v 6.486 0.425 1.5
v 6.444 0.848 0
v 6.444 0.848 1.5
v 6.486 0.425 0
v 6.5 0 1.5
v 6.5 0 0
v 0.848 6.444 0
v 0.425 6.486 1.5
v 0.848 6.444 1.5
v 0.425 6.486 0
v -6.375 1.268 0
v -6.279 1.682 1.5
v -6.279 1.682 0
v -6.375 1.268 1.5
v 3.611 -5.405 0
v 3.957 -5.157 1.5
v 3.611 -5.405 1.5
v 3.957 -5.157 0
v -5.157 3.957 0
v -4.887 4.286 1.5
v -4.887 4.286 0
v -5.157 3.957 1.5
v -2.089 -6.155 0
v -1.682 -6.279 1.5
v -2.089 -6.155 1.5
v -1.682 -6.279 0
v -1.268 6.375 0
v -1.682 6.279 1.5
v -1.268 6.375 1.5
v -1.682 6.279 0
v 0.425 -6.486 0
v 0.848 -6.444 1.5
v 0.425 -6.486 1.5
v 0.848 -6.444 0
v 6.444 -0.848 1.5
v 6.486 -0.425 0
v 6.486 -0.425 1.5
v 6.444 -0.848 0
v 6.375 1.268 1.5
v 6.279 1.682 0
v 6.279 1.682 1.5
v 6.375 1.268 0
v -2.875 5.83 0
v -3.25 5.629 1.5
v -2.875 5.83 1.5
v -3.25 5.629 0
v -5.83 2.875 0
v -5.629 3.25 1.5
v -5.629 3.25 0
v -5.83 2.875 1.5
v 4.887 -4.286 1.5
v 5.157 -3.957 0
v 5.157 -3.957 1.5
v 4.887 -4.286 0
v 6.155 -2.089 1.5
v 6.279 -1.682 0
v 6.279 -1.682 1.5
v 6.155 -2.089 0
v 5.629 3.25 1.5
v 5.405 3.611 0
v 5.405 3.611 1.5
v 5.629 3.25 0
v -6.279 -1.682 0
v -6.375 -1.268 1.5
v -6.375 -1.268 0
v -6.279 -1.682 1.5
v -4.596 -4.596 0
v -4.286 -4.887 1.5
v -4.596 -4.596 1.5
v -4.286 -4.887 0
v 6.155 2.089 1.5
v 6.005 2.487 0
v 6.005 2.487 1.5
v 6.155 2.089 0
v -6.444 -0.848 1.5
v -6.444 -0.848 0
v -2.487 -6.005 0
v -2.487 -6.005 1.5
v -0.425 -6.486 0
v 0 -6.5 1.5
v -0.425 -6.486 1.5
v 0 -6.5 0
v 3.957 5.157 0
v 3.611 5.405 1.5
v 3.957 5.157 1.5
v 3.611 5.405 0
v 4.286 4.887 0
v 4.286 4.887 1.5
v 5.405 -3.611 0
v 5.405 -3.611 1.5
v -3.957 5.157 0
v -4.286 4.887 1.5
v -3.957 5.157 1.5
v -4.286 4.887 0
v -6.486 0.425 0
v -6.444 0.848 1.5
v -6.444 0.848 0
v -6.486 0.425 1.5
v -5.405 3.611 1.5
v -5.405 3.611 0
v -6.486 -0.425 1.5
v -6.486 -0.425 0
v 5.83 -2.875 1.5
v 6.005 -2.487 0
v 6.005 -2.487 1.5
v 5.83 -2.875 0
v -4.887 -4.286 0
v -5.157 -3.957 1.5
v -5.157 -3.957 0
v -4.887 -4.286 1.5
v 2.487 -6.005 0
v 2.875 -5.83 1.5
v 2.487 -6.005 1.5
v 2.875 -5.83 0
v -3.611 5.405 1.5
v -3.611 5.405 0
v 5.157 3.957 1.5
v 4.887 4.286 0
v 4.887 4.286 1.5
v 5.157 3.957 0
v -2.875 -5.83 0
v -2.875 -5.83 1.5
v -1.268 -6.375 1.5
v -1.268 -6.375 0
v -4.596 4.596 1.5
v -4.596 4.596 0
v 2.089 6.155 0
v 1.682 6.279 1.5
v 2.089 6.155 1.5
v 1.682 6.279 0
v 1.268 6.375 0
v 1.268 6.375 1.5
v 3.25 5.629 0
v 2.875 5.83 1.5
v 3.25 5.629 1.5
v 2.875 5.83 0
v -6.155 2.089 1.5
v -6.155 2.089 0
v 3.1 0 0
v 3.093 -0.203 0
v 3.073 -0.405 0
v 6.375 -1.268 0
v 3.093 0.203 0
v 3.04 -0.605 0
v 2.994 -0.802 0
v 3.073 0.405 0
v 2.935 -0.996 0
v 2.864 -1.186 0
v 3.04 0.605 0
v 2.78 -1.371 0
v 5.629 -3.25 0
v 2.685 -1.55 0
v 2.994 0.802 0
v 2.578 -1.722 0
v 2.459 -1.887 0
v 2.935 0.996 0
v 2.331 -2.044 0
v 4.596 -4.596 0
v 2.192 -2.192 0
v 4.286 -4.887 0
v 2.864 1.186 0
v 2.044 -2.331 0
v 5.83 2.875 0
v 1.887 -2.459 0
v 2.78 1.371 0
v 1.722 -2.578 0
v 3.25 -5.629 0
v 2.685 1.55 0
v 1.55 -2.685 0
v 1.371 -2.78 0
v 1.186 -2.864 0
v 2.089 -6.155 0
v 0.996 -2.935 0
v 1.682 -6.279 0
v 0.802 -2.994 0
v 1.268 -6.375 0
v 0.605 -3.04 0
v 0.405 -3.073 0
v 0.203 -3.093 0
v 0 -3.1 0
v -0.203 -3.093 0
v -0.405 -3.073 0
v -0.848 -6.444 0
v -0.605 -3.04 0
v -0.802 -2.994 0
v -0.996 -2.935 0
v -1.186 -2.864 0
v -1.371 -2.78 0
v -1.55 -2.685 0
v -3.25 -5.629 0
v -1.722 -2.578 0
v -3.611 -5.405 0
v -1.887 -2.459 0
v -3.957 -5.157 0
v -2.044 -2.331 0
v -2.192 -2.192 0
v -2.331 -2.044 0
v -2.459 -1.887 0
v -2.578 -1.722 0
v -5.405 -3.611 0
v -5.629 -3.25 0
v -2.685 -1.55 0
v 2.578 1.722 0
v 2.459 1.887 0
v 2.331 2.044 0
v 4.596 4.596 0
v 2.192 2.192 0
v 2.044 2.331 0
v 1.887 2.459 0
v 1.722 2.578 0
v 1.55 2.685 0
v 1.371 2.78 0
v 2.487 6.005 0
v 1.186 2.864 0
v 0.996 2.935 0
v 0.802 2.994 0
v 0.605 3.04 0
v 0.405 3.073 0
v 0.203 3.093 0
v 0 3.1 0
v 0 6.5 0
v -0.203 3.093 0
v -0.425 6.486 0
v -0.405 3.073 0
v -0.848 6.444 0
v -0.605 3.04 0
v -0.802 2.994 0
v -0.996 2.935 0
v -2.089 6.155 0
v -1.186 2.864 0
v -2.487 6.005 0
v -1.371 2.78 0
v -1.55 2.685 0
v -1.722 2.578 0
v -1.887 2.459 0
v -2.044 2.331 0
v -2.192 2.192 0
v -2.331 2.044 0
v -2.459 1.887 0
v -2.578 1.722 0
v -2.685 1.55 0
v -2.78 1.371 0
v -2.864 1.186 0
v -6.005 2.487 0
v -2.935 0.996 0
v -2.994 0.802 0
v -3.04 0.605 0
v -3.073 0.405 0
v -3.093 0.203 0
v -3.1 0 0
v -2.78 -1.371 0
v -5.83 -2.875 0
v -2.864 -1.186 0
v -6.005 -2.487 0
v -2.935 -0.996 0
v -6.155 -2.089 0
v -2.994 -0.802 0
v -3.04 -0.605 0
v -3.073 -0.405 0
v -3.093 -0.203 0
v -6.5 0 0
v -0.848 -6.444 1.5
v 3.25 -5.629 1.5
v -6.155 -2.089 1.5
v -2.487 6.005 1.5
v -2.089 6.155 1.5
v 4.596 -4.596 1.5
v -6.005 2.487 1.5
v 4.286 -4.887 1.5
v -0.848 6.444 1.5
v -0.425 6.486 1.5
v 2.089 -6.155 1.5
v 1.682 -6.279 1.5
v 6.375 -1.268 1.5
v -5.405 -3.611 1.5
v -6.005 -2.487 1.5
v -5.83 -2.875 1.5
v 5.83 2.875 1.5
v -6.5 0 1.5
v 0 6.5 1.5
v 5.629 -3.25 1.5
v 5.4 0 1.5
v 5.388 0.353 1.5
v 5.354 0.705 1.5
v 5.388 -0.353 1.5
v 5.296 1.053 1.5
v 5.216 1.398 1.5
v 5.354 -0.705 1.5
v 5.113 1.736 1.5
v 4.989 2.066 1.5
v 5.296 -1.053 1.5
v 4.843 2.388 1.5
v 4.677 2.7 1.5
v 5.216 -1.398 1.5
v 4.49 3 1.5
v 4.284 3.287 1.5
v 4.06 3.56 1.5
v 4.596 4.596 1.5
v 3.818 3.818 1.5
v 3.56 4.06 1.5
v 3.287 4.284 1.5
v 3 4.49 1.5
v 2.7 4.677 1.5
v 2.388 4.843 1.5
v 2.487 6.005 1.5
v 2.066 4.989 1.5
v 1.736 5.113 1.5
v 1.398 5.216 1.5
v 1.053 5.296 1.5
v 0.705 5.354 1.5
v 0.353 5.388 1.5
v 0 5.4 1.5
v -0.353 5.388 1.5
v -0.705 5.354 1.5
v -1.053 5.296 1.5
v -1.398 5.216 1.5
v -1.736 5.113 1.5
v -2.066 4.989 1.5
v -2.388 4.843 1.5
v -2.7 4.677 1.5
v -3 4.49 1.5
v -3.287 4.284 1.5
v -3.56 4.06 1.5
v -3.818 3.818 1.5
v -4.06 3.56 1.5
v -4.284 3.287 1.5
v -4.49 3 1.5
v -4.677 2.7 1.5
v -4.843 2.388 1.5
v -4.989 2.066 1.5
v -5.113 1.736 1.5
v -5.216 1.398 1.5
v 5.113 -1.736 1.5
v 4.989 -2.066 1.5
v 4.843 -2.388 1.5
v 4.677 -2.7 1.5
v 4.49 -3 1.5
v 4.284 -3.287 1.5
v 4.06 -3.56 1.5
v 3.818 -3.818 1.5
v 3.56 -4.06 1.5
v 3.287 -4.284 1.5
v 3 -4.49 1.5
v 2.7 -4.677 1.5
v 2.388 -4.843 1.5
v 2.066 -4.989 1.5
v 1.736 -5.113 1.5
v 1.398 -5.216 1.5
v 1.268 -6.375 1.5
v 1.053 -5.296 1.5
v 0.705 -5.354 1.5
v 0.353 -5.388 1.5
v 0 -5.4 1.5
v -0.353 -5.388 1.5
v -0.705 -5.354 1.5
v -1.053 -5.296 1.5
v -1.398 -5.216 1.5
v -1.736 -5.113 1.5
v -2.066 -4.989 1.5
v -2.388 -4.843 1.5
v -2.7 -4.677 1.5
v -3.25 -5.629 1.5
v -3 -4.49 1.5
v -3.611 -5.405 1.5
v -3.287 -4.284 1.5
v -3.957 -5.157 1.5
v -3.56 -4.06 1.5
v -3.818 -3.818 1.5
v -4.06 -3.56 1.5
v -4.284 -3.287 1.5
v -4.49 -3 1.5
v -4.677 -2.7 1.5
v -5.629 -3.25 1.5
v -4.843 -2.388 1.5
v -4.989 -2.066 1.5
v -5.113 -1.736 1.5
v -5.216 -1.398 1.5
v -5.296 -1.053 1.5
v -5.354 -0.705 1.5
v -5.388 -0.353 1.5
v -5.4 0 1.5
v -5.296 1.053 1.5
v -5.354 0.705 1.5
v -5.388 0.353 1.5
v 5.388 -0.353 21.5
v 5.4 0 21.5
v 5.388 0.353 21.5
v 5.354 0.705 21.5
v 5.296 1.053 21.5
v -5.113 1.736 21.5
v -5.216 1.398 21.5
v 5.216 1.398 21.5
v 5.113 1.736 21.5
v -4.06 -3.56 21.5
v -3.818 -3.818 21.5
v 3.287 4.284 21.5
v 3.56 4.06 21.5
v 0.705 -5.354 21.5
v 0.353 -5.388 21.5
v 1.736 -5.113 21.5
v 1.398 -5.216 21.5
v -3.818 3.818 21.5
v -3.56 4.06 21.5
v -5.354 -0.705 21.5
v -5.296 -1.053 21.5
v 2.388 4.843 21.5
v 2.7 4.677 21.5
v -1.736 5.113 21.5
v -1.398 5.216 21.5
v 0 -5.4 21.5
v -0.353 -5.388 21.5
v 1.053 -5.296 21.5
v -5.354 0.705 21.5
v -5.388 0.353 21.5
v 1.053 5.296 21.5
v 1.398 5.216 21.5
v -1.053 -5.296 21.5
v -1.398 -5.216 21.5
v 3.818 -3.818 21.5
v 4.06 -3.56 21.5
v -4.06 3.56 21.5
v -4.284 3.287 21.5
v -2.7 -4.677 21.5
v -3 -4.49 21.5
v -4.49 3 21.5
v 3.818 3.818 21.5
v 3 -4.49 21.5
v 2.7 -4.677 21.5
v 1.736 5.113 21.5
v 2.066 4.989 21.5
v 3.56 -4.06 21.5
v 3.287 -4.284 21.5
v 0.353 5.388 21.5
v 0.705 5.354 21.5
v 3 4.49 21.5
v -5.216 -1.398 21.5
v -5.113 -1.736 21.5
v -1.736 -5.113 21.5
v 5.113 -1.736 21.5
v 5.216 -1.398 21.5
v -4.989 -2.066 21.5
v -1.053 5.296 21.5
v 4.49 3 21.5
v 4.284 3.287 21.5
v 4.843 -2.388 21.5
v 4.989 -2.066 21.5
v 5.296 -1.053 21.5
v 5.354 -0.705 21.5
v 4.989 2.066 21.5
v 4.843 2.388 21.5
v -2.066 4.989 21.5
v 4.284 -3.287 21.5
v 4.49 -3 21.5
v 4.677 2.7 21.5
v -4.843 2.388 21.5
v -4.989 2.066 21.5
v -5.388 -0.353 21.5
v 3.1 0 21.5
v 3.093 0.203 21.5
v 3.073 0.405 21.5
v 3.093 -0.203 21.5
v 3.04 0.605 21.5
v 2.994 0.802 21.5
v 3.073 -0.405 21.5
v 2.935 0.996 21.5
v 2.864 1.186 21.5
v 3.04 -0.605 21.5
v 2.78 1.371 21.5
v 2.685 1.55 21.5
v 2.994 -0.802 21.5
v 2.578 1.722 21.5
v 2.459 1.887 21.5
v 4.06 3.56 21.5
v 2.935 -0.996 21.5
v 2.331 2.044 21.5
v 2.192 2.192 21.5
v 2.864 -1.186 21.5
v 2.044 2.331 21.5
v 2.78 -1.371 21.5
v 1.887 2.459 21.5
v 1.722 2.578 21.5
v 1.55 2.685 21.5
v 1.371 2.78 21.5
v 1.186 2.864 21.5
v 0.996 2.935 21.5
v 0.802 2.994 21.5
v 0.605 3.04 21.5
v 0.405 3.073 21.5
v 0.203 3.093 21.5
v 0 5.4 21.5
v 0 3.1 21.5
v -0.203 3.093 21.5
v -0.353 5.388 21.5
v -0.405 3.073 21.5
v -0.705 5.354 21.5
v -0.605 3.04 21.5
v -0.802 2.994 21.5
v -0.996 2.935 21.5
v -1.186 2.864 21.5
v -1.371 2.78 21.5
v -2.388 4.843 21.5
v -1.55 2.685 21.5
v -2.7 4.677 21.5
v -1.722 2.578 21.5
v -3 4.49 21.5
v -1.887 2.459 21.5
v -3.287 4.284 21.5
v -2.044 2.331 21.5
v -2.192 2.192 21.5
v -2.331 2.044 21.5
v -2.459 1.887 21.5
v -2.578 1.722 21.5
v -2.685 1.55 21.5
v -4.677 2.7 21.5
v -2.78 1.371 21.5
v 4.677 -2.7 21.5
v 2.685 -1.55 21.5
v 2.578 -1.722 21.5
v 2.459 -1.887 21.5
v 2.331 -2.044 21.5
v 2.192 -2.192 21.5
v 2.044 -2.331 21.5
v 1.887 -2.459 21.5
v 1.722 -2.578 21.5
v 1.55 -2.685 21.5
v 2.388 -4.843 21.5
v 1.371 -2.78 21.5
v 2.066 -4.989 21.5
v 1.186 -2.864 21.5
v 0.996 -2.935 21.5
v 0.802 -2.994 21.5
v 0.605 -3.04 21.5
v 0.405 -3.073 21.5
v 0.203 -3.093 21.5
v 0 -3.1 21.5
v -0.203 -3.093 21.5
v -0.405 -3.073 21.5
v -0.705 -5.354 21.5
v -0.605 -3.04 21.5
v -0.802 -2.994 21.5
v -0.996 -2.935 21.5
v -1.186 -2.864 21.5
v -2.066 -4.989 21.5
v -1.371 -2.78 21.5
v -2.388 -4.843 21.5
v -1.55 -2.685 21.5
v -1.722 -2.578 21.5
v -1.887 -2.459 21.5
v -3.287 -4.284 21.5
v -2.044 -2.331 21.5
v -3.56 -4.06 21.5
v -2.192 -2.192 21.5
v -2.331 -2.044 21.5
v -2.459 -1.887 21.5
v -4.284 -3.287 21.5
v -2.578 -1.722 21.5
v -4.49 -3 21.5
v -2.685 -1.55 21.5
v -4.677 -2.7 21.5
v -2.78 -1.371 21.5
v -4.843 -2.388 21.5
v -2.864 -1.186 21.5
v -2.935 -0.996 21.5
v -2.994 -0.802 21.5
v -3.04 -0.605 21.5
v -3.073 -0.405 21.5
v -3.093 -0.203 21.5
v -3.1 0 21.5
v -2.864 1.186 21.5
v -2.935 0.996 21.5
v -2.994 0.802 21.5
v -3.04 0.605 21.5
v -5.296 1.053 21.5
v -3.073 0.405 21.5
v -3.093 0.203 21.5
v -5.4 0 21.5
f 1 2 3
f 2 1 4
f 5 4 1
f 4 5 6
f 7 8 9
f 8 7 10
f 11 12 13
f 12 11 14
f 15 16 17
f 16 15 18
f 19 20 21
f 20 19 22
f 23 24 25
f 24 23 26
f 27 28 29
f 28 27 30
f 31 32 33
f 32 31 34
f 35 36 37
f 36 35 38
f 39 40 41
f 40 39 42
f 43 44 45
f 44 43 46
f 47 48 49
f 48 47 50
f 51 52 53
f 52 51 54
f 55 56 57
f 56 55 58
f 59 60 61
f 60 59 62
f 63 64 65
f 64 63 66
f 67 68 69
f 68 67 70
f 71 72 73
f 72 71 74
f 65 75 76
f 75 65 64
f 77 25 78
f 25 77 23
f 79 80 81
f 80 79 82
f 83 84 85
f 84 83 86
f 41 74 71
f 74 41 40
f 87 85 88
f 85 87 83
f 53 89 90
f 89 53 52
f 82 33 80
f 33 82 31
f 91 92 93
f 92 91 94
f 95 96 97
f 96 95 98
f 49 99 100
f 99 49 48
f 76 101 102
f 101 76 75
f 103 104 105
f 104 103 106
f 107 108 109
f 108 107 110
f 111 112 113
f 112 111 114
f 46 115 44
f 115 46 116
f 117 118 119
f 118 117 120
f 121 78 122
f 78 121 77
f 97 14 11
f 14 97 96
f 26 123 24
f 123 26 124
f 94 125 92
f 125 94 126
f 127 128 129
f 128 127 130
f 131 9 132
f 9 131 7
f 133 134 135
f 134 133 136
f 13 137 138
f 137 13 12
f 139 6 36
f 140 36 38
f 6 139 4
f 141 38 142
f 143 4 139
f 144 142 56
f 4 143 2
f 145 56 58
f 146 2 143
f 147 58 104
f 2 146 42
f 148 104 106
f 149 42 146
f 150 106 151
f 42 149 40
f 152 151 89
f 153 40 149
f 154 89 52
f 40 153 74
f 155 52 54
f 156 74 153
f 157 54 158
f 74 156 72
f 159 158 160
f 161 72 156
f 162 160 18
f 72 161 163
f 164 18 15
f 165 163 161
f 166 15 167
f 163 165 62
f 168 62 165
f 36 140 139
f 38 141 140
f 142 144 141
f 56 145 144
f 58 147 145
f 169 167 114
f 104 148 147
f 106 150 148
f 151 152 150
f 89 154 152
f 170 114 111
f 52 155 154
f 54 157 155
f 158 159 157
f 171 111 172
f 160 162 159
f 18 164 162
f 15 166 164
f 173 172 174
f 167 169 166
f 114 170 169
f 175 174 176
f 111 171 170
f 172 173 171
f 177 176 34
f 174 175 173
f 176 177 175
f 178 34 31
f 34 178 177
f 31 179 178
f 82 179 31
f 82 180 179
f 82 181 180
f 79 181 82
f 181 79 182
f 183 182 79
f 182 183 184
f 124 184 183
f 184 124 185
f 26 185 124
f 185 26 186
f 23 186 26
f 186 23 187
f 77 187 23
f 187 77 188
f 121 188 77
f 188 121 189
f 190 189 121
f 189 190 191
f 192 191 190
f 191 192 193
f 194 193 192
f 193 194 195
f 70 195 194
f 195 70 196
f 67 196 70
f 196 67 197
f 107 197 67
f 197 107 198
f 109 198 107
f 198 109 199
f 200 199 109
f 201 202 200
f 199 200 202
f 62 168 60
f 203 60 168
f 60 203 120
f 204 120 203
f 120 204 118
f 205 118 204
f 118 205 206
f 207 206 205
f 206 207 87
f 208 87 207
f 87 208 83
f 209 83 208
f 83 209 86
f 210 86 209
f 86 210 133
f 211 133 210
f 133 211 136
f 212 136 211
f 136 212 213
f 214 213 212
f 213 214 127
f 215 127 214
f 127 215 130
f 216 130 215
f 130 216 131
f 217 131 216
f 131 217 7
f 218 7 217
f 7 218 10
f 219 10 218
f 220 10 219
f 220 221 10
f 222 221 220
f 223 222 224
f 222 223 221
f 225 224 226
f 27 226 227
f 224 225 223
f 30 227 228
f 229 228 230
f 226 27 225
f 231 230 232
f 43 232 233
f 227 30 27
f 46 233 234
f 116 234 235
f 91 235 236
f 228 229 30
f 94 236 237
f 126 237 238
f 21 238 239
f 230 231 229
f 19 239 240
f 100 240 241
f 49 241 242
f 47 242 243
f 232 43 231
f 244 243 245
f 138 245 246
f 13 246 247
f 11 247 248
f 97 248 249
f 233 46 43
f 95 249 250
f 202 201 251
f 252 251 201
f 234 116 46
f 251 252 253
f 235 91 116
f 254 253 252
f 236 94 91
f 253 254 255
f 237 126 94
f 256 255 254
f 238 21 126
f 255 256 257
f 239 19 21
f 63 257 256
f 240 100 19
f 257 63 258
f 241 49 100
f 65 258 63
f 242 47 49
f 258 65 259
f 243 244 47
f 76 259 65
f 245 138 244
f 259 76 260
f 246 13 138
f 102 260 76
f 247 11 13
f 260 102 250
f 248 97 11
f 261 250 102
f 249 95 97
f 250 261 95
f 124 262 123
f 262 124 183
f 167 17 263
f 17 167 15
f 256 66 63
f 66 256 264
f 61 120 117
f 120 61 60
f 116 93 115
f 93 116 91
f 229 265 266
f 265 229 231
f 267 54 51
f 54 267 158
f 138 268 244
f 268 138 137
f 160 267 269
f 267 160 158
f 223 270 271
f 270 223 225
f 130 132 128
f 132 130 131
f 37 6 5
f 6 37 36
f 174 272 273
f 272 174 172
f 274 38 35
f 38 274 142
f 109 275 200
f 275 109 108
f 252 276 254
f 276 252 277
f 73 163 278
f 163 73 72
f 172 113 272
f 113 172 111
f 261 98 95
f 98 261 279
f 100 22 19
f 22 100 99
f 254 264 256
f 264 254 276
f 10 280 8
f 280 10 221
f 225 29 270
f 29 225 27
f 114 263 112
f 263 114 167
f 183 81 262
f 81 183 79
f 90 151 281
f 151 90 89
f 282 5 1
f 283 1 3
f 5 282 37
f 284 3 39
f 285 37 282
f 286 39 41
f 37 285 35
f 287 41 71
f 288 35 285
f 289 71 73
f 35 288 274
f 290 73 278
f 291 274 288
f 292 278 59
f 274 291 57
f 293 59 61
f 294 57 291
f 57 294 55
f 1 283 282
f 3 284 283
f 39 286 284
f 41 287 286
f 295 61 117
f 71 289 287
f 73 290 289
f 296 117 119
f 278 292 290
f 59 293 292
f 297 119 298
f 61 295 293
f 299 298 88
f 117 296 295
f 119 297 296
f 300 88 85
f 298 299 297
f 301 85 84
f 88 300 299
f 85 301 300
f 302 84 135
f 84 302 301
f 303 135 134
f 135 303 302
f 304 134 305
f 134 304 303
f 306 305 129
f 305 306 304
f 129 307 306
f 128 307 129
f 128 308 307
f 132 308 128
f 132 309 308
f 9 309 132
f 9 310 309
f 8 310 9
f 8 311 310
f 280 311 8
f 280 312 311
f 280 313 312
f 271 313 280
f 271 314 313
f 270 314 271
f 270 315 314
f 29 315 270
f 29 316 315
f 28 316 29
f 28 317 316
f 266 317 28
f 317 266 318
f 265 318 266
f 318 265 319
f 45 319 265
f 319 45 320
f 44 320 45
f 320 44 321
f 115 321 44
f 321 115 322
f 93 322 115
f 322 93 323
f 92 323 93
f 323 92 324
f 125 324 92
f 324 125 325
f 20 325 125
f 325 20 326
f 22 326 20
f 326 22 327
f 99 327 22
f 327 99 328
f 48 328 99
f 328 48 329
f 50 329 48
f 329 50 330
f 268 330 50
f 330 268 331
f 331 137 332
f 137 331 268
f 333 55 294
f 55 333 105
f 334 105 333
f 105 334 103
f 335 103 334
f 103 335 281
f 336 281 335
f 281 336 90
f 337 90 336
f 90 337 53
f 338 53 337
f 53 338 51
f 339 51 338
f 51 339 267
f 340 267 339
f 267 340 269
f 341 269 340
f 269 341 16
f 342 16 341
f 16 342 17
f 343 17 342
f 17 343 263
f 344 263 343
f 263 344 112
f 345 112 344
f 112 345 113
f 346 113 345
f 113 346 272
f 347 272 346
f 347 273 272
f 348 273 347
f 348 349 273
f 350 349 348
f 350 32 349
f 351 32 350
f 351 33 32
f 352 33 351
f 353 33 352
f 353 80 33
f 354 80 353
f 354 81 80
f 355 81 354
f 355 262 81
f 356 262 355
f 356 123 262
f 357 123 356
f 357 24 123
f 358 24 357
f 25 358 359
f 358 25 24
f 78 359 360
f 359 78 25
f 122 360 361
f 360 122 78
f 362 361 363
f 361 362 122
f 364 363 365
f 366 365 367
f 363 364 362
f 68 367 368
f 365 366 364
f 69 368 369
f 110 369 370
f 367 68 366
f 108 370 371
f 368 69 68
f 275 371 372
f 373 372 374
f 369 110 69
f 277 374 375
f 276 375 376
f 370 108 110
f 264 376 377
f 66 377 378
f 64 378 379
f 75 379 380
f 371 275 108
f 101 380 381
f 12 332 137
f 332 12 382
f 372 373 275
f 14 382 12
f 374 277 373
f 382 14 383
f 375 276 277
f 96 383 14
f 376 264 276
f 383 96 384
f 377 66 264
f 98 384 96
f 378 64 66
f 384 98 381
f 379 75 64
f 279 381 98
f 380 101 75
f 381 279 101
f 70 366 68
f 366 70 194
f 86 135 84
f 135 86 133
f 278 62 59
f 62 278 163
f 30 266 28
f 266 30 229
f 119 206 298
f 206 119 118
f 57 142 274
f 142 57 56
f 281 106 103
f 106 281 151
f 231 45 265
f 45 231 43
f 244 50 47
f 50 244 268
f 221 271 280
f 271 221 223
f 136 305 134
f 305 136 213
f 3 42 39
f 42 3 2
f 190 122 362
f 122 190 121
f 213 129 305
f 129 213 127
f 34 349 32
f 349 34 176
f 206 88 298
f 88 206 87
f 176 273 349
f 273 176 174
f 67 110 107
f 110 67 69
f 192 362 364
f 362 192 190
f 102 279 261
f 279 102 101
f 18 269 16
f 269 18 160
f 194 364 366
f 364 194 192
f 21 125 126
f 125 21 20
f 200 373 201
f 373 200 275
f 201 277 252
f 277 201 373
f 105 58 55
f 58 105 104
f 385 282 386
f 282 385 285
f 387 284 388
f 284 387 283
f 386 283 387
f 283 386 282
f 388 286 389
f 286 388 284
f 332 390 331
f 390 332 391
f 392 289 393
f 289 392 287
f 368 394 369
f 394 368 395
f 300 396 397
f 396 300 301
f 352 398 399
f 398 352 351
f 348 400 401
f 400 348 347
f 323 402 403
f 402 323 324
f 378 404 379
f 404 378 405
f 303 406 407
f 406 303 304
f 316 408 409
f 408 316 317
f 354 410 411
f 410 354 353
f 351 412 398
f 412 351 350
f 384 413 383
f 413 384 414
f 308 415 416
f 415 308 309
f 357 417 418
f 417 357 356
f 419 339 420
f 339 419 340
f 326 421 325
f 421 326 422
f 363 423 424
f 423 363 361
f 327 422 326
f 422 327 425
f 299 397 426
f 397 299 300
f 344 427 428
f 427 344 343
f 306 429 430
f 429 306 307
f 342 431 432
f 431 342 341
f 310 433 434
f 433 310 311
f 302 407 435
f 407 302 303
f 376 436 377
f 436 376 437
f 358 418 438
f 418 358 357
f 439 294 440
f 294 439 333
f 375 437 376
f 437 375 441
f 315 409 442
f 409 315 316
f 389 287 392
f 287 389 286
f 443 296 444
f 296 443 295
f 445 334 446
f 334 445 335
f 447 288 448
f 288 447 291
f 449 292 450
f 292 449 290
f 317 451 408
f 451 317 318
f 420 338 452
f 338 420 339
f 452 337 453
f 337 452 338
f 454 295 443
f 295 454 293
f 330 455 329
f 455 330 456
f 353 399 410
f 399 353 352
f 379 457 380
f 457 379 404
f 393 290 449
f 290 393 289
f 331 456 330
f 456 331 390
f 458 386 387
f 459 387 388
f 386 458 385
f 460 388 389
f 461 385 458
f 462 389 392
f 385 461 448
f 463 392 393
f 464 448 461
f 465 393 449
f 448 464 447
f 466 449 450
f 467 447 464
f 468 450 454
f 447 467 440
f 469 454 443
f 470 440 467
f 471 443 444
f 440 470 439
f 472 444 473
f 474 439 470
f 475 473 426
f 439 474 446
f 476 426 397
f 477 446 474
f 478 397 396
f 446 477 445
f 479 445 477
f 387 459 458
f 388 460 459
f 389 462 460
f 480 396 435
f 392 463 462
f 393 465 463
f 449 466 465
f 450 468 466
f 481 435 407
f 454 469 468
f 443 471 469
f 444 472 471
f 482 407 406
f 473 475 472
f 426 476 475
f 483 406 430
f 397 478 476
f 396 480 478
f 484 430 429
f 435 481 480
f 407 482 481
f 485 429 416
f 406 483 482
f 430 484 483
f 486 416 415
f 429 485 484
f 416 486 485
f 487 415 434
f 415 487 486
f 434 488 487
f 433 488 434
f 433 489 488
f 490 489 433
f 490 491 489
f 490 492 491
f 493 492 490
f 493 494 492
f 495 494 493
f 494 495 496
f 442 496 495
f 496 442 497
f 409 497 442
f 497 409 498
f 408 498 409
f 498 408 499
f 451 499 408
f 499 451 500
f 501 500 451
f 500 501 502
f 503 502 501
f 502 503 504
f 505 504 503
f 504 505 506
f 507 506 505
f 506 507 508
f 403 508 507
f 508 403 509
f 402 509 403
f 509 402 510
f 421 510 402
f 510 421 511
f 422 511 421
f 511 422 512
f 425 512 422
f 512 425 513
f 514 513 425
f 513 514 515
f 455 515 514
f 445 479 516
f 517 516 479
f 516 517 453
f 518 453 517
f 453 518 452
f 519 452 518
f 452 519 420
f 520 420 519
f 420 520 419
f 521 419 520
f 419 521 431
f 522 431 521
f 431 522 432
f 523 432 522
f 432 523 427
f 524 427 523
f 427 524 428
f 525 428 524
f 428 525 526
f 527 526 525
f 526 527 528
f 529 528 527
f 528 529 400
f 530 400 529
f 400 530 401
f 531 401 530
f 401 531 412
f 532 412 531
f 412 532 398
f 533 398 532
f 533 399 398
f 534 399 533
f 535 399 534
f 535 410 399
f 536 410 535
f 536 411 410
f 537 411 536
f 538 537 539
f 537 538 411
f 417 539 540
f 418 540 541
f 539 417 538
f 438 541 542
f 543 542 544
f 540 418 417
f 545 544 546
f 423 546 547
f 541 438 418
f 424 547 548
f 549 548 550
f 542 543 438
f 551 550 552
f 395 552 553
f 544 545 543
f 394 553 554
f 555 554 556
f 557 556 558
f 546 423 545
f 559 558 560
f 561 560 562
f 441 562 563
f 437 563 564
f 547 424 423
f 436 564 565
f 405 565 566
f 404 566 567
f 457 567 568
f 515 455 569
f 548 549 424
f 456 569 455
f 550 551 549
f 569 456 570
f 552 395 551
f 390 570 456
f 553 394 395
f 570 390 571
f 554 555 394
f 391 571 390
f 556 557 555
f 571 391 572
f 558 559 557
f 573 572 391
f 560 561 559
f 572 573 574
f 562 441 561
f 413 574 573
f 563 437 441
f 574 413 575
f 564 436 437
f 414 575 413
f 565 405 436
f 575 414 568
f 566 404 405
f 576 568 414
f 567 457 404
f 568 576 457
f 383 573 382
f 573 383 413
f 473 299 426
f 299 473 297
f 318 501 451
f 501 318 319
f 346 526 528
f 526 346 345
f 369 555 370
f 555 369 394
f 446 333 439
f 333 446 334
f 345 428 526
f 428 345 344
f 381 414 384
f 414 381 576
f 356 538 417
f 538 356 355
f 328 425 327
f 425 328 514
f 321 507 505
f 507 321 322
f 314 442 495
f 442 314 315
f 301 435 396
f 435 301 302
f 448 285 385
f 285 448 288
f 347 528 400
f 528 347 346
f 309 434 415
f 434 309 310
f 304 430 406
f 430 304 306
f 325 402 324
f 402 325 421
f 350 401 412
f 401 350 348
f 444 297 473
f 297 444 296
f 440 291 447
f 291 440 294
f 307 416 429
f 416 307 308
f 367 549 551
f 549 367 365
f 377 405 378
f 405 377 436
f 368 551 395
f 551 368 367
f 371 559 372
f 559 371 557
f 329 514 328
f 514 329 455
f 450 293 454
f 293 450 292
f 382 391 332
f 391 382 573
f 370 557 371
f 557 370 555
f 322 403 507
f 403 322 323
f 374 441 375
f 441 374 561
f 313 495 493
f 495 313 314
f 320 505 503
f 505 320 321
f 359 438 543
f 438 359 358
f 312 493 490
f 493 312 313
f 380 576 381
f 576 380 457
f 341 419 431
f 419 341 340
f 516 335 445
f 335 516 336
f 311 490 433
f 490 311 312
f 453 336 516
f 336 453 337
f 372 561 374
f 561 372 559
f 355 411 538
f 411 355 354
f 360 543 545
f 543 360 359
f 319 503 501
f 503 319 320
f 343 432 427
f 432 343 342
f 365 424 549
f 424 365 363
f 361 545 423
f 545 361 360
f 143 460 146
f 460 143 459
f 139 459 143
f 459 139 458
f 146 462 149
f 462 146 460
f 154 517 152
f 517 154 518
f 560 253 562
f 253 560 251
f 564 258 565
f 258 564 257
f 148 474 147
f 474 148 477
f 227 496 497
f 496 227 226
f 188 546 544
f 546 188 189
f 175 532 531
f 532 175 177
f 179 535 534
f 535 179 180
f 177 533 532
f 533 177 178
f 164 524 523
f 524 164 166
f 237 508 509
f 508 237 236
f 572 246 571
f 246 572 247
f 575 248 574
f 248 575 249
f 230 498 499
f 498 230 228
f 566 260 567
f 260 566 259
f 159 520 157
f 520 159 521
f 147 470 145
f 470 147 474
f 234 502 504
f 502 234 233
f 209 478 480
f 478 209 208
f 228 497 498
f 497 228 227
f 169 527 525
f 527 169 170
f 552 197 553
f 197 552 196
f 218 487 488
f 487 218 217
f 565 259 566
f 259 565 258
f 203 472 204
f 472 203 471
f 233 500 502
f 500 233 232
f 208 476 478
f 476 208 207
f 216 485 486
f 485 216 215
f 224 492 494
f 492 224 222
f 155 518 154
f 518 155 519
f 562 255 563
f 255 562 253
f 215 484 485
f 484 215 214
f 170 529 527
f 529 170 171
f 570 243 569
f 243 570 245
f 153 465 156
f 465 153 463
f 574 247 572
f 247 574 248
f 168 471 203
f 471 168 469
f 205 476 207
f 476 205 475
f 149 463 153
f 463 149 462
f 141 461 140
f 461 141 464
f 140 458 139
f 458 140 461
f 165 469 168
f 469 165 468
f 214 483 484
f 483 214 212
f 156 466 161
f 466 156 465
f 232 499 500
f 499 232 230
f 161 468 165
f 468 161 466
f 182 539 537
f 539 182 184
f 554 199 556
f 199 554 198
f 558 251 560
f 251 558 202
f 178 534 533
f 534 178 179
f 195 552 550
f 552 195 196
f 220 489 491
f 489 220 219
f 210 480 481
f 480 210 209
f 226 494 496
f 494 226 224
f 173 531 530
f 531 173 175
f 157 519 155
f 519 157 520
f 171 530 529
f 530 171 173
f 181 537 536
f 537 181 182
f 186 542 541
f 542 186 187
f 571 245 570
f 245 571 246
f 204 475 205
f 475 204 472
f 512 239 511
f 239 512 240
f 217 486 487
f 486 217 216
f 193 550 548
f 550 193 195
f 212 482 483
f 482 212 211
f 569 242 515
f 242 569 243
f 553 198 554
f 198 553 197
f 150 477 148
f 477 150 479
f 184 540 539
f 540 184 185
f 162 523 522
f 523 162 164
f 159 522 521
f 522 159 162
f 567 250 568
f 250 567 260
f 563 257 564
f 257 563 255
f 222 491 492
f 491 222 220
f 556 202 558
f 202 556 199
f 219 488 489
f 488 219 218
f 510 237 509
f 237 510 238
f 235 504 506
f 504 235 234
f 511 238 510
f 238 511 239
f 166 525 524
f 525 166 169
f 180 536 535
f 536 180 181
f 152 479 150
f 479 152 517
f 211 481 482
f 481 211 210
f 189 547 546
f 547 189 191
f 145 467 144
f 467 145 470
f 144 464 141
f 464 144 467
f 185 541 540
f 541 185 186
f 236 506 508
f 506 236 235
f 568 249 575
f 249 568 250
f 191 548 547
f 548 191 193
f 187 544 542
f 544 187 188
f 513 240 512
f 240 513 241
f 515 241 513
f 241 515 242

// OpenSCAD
// PCR tube adapter sleeve: fits a 0.2 mL tube into a 1.5 mL rack hole
// Print orientation: collar on the bed (z = 0), sleeve body rises to z = 21.5

// ---------------- Parameters ----------------
collar_d      = 13;    // collar outer diameter (mm)
collar_h      = 1.5;   // collar thickness (mm)
sleeve_od     = 10.8;  // sleeve body outer diameter (mm)
sleeve_h      = 20;    // sleeve body height above collar (mm)
bore_d        = 6.2;   // through-bore diameter (mm)
eps           = 0.5;   // cutter overshoot past faces (mm)

$fn = 96;              // facet count for round features

// ---------------- Derived ----------------
sleeve_top_z   = collar_h + sleeve_h;   // top of sleeve body (21.5 mm)
wall_t         = sleeve_od - bore_d;    // sleeve wall thickness

// ---------------- Model ----------------
difference() {
    union() {
        // Collar
        cylinder(d = collar_d, h = collar_h);

        // Sleeve body (slightly overlapping the collar for a clean union)
        translate([0, 0, collar_h - 0.01])
            cylinder(d = sleeve_od, h = sleeve_h + 0.01);
    }

    // Straight through-bore
    translate([0, 0, -eps])
        cylinder(d = bore_d, h = sleeve_top_z + 2 * eps);
}
